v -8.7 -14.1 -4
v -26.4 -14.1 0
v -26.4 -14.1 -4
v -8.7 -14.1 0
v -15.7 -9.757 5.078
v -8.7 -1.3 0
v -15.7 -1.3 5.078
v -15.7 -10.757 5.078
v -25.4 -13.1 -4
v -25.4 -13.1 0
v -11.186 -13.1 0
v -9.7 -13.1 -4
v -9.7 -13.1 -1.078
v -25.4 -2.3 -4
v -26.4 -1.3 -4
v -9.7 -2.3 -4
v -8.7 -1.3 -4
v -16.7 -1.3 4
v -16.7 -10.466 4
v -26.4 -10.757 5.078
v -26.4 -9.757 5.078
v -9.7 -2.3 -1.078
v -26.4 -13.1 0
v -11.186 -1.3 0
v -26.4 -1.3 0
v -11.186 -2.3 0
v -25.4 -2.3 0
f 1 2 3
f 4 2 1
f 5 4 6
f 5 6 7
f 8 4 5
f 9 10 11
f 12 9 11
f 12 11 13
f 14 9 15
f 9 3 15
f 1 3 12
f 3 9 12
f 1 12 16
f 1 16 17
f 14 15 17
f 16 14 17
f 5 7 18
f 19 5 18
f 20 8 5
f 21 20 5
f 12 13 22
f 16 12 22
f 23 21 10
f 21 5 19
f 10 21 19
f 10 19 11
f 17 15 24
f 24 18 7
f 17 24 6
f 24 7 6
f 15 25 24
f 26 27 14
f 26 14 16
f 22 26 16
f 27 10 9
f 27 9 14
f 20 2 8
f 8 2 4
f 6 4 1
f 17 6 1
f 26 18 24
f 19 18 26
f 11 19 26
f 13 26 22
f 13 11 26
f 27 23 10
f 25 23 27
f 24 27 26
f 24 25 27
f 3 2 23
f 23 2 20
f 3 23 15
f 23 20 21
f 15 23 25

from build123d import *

# Parameters (mm, degrees)
SKETCH1_W           = 17.7
SKETCH1_H           = 12.8
SKETCH1_W_2         = 15.7
SKETCH1_H_2         = 10.8
BOSS_EXTRUDE1_DEPTH = 4
BOSS_EXTRUDE2_DEPTH = 12.8
BOSS_EXTRUDE3_DEPTH = 17.7
CUT_EXTRUDE1_DEPTH  = 18.7
CUT_EXTRUDE3_REACH  = 19.7


with BuildPart() as part:
    # Sketch1 → Boss-Extrude1 (new body)
    with BuildSketch(Plane.XY):
        with Locations((-17.55, -7.7)):
            Rectangle(SKETCH1_W, SKETCH1_H)
        with Locations((-17.55, -7.7)):
            Rectangle(SKETCH1_W_2, SKETCH1_H_2, mode=Mode.SUBTRACT)
    extrude(amount=-BOSS_EXTRUDE1_DEPTH)

    # Sketch7 → Boss-Extrude2 (add)
    with BuildSketch(Plane.XZ.offset(14.1)):
        Polygon((-8.7, 0), (-15.7, 5.077748715), (-16.7, 4), (-9.7, -1.077748715), align=None)
    extrude(amount=-BOSS_EXTRUDE2_DEPTH)

    # Sketch11 → Boss-Extrude3 (add)
    with BuildSketch(Plane(origin=(-8.7, 0, -8.7), x_dir=(0, 0, 1), z_dir=(1, 0, 0))):
        Polygon((8.7, 13.1), (8.7, 14.1), (13.777748715, 10.756920169), (13.777748715, 9.756920169), align=None)
    extrude(amount=-BOSS_EXTRUDE3_DEPTH)

    # Sketch13 → Cut-Extrude1 (cut, through all)
    with BuildSketch(Plane(origin=(-8.7, 0, 0), x_dir=(0, 0, -1), z_dir=(1, 0, 0))):
        Polygon((-5.077748715, -10.756920169), (-5.077748715, -15.295870945), (0, -14.1), align=None)
    extrude(amount=-CUT_EXTRUDE1_DEPTH, mode=Mode.SUBTRACT)

    # Cut-Extrude3: up to this face of the body (flat: up to its plane)
    cut_extrude3_end = Plane(part.part.faces().sort_by_distance((-12.007460376, -6.410206852, 2.399207524))[0])
    # Sketch11<3> → Cut-Extrude3 (cut, up to the picked face)
    with BuildSketch(Plane(origin=(-8.7, 0, -8.7), x_dir=(0, 0, 1), z_dir=(1, 0, 0)), mode=Mode.PRIVATE) as cut_extrude3_sk1:
        Polygon((8.7, 13.1), (8.7, 14.1), (13.777748715, 10.756920169), (13.777748715, 9.756920169), align=None)
    cut_extrude3_tool1 = split(extrude(cut_extrude3_sk1.sketch, amount=-CUT_EXTRUDE3_REACH, mode=Mode.PRIVATE), bisect_by=cut_extrude3_end, keep=Keep.BOTH, mode=Mode.PRIVATE)
    add(cut_extrude3_tool1.solids().sort_by_distance((-8.7, -11.92846, 2.538874))[0], mode=Mode.SUBTRACT)


solid = part.part
